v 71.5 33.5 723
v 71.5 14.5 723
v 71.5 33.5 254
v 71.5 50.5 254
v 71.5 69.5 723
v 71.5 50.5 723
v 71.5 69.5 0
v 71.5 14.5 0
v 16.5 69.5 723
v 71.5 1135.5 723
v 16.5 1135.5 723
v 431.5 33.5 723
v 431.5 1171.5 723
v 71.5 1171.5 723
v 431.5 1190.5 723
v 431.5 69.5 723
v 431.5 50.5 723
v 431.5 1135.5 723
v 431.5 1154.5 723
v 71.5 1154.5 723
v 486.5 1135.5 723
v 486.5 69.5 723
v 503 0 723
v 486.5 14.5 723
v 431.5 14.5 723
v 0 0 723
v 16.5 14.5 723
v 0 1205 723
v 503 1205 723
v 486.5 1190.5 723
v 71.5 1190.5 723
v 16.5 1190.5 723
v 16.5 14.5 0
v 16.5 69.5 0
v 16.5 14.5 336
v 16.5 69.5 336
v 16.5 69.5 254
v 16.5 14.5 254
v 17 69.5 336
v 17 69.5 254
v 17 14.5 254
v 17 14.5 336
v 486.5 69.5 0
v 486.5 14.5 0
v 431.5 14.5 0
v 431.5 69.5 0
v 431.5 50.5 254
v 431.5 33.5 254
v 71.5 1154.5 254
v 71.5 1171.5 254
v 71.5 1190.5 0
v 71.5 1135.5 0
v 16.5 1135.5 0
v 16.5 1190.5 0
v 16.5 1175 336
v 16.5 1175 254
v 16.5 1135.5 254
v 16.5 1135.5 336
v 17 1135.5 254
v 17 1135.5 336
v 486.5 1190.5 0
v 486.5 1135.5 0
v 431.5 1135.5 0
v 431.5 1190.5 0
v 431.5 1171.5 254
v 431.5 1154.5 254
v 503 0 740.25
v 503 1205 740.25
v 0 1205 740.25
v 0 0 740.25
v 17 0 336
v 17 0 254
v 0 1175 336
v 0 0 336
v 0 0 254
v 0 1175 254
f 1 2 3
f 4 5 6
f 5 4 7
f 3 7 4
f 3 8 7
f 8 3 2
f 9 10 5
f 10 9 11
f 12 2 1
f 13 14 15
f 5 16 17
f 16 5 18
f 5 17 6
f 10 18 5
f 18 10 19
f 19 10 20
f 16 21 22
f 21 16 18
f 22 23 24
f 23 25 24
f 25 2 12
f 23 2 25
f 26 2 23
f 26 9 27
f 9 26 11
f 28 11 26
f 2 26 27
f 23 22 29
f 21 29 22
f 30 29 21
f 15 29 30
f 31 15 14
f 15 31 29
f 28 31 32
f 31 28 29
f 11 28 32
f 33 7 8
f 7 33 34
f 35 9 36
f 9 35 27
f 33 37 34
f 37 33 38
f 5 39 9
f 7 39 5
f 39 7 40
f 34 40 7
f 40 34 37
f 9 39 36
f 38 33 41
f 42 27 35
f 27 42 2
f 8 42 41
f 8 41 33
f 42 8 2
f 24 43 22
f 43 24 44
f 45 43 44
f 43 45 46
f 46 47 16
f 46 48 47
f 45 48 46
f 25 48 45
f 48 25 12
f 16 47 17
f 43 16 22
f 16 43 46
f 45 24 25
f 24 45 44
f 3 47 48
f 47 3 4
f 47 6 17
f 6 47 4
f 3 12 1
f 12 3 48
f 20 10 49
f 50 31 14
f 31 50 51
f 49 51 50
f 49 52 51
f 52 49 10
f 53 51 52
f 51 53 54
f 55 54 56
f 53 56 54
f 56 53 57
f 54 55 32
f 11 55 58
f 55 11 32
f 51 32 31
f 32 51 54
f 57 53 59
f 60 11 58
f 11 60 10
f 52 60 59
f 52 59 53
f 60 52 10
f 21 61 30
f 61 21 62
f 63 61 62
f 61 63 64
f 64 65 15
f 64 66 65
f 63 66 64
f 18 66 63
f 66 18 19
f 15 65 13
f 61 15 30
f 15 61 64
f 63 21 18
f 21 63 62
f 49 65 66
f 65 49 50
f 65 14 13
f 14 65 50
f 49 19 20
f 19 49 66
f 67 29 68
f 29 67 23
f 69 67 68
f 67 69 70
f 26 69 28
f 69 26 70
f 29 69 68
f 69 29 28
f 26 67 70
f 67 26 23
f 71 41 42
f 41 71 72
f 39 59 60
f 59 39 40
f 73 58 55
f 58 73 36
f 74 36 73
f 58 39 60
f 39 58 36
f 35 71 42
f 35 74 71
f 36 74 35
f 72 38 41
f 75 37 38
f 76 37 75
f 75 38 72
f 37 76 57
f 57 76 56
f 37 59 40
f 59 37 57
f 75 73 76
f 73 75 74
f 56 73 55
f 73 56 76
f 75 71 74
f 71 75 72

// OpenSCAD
// file: ../wiki-yoinks/prism.scad
module prism(l, w, h) {
    // from wiki
    // https://en.wikibooks.org/wiki/OpenSCAD_User_Manual/Primitive_Solids#polyhedron
    polyhedron(points =
                   [
                       [ 0, 0, 0 ], [ l, 0, 0 ], [ l, w, 0 ], [ 0, w, 0 ],
                       [ 0, w, h ], [ l, w, h ]
                   ],
               faces = [
                   [ 0, 1, 2, 3 ], [ 5, 4, 3, 2 ], [ 0, 4, 5, 1 ], [ 0, 3, 4 ],
                   [ 5, 2, 1 ]
               ]);
}
// file: ../shapes/oval-tube.scad
module OvalTube(height, radius, eccentricity){
    linear_extrude(height=height){
        scale([1,eccentricity]){
            circle(r=radius);
        }
    }
}
// main file
use <../shapes/oval-tube.scad>
use <../wiki-yoinks/prism.scad> //prism(l, w, h)


deskPlankThickness = 55-38;
deskPlankEmptySpace = 254;
backPlankHeight = 82;

deskLegWidth = 55;
deskLegDistanceSide = 14.5;

deskWidth = 503;
deskBaseWidth=470;
deskTopThickness = 17.25;
deskHeight = 778;
deskLength = 1205;

deskLegHeight = deskHeight-deskLegWidth;
deskPlankHeight = deskLegHeight-deskPlankEmptySpace;
backPlankLength = deskLength-deskLegDistanceSide*2-1;
deskLegDistanceFront = (deskWidth-deskBaseWidth)/2;


module Desk(){
    module Top(){
        color([249/255, 228/255, 183/255]) {

        cube([deskWidth, deskLength,  deskTopThickness]);
    }

    }
    module Leg(){
        color([15/255, 15/255, 128/255]) {
            cube([deskLegWidth, deskLegWidth, deskLegHeight]);
            
        }
    }
    module PlankThing(){
        color([15/255, 15/255, 75/255]) {
            cube([ deskBaseWidth-1, deskPlankThickness, deskPlankHeight]);
        }
    }
    module BackPlank(){
        color([15/255, 15/255, 75/255]) {
            cube([deskPlankThickness, backPlankLength, backPlankHeight]);
        }
    }

        
    translate([0,0,deskLegHeight]){
        Top();
    }
    translate([0,0,deskPlankEmptySpace]){
        BackPlank();
    }
        
    translate([deskLegDistanceFront, deskLegDistanceSide, 0]) {
        Leg();
        translate([deskWidth-deskLegDistanceFront*2-deskLegWidth, 0, 0]) {
            Leg();
        }
        translate([0.5,deskLegWidth/2-deskPlankThickness/2,deskPlankEmptySpace]){       
             PlankThing();
        }

    }
    translate([deskLegDistanceFront, deskLength-deskLegDistanceSide-deskLegWidth, 0]) {
        Leg();
        translate([deskWidth-deskLegDistanceFront*2-deskLegWidth, 0, 0]) {
            Leg();
        }
        translate([0.5,deskLegWidth/2-deskPlankThickness/2,deskPlankEmptySpace]){       
             PlankThing();
        }
    }
}




Desk();
